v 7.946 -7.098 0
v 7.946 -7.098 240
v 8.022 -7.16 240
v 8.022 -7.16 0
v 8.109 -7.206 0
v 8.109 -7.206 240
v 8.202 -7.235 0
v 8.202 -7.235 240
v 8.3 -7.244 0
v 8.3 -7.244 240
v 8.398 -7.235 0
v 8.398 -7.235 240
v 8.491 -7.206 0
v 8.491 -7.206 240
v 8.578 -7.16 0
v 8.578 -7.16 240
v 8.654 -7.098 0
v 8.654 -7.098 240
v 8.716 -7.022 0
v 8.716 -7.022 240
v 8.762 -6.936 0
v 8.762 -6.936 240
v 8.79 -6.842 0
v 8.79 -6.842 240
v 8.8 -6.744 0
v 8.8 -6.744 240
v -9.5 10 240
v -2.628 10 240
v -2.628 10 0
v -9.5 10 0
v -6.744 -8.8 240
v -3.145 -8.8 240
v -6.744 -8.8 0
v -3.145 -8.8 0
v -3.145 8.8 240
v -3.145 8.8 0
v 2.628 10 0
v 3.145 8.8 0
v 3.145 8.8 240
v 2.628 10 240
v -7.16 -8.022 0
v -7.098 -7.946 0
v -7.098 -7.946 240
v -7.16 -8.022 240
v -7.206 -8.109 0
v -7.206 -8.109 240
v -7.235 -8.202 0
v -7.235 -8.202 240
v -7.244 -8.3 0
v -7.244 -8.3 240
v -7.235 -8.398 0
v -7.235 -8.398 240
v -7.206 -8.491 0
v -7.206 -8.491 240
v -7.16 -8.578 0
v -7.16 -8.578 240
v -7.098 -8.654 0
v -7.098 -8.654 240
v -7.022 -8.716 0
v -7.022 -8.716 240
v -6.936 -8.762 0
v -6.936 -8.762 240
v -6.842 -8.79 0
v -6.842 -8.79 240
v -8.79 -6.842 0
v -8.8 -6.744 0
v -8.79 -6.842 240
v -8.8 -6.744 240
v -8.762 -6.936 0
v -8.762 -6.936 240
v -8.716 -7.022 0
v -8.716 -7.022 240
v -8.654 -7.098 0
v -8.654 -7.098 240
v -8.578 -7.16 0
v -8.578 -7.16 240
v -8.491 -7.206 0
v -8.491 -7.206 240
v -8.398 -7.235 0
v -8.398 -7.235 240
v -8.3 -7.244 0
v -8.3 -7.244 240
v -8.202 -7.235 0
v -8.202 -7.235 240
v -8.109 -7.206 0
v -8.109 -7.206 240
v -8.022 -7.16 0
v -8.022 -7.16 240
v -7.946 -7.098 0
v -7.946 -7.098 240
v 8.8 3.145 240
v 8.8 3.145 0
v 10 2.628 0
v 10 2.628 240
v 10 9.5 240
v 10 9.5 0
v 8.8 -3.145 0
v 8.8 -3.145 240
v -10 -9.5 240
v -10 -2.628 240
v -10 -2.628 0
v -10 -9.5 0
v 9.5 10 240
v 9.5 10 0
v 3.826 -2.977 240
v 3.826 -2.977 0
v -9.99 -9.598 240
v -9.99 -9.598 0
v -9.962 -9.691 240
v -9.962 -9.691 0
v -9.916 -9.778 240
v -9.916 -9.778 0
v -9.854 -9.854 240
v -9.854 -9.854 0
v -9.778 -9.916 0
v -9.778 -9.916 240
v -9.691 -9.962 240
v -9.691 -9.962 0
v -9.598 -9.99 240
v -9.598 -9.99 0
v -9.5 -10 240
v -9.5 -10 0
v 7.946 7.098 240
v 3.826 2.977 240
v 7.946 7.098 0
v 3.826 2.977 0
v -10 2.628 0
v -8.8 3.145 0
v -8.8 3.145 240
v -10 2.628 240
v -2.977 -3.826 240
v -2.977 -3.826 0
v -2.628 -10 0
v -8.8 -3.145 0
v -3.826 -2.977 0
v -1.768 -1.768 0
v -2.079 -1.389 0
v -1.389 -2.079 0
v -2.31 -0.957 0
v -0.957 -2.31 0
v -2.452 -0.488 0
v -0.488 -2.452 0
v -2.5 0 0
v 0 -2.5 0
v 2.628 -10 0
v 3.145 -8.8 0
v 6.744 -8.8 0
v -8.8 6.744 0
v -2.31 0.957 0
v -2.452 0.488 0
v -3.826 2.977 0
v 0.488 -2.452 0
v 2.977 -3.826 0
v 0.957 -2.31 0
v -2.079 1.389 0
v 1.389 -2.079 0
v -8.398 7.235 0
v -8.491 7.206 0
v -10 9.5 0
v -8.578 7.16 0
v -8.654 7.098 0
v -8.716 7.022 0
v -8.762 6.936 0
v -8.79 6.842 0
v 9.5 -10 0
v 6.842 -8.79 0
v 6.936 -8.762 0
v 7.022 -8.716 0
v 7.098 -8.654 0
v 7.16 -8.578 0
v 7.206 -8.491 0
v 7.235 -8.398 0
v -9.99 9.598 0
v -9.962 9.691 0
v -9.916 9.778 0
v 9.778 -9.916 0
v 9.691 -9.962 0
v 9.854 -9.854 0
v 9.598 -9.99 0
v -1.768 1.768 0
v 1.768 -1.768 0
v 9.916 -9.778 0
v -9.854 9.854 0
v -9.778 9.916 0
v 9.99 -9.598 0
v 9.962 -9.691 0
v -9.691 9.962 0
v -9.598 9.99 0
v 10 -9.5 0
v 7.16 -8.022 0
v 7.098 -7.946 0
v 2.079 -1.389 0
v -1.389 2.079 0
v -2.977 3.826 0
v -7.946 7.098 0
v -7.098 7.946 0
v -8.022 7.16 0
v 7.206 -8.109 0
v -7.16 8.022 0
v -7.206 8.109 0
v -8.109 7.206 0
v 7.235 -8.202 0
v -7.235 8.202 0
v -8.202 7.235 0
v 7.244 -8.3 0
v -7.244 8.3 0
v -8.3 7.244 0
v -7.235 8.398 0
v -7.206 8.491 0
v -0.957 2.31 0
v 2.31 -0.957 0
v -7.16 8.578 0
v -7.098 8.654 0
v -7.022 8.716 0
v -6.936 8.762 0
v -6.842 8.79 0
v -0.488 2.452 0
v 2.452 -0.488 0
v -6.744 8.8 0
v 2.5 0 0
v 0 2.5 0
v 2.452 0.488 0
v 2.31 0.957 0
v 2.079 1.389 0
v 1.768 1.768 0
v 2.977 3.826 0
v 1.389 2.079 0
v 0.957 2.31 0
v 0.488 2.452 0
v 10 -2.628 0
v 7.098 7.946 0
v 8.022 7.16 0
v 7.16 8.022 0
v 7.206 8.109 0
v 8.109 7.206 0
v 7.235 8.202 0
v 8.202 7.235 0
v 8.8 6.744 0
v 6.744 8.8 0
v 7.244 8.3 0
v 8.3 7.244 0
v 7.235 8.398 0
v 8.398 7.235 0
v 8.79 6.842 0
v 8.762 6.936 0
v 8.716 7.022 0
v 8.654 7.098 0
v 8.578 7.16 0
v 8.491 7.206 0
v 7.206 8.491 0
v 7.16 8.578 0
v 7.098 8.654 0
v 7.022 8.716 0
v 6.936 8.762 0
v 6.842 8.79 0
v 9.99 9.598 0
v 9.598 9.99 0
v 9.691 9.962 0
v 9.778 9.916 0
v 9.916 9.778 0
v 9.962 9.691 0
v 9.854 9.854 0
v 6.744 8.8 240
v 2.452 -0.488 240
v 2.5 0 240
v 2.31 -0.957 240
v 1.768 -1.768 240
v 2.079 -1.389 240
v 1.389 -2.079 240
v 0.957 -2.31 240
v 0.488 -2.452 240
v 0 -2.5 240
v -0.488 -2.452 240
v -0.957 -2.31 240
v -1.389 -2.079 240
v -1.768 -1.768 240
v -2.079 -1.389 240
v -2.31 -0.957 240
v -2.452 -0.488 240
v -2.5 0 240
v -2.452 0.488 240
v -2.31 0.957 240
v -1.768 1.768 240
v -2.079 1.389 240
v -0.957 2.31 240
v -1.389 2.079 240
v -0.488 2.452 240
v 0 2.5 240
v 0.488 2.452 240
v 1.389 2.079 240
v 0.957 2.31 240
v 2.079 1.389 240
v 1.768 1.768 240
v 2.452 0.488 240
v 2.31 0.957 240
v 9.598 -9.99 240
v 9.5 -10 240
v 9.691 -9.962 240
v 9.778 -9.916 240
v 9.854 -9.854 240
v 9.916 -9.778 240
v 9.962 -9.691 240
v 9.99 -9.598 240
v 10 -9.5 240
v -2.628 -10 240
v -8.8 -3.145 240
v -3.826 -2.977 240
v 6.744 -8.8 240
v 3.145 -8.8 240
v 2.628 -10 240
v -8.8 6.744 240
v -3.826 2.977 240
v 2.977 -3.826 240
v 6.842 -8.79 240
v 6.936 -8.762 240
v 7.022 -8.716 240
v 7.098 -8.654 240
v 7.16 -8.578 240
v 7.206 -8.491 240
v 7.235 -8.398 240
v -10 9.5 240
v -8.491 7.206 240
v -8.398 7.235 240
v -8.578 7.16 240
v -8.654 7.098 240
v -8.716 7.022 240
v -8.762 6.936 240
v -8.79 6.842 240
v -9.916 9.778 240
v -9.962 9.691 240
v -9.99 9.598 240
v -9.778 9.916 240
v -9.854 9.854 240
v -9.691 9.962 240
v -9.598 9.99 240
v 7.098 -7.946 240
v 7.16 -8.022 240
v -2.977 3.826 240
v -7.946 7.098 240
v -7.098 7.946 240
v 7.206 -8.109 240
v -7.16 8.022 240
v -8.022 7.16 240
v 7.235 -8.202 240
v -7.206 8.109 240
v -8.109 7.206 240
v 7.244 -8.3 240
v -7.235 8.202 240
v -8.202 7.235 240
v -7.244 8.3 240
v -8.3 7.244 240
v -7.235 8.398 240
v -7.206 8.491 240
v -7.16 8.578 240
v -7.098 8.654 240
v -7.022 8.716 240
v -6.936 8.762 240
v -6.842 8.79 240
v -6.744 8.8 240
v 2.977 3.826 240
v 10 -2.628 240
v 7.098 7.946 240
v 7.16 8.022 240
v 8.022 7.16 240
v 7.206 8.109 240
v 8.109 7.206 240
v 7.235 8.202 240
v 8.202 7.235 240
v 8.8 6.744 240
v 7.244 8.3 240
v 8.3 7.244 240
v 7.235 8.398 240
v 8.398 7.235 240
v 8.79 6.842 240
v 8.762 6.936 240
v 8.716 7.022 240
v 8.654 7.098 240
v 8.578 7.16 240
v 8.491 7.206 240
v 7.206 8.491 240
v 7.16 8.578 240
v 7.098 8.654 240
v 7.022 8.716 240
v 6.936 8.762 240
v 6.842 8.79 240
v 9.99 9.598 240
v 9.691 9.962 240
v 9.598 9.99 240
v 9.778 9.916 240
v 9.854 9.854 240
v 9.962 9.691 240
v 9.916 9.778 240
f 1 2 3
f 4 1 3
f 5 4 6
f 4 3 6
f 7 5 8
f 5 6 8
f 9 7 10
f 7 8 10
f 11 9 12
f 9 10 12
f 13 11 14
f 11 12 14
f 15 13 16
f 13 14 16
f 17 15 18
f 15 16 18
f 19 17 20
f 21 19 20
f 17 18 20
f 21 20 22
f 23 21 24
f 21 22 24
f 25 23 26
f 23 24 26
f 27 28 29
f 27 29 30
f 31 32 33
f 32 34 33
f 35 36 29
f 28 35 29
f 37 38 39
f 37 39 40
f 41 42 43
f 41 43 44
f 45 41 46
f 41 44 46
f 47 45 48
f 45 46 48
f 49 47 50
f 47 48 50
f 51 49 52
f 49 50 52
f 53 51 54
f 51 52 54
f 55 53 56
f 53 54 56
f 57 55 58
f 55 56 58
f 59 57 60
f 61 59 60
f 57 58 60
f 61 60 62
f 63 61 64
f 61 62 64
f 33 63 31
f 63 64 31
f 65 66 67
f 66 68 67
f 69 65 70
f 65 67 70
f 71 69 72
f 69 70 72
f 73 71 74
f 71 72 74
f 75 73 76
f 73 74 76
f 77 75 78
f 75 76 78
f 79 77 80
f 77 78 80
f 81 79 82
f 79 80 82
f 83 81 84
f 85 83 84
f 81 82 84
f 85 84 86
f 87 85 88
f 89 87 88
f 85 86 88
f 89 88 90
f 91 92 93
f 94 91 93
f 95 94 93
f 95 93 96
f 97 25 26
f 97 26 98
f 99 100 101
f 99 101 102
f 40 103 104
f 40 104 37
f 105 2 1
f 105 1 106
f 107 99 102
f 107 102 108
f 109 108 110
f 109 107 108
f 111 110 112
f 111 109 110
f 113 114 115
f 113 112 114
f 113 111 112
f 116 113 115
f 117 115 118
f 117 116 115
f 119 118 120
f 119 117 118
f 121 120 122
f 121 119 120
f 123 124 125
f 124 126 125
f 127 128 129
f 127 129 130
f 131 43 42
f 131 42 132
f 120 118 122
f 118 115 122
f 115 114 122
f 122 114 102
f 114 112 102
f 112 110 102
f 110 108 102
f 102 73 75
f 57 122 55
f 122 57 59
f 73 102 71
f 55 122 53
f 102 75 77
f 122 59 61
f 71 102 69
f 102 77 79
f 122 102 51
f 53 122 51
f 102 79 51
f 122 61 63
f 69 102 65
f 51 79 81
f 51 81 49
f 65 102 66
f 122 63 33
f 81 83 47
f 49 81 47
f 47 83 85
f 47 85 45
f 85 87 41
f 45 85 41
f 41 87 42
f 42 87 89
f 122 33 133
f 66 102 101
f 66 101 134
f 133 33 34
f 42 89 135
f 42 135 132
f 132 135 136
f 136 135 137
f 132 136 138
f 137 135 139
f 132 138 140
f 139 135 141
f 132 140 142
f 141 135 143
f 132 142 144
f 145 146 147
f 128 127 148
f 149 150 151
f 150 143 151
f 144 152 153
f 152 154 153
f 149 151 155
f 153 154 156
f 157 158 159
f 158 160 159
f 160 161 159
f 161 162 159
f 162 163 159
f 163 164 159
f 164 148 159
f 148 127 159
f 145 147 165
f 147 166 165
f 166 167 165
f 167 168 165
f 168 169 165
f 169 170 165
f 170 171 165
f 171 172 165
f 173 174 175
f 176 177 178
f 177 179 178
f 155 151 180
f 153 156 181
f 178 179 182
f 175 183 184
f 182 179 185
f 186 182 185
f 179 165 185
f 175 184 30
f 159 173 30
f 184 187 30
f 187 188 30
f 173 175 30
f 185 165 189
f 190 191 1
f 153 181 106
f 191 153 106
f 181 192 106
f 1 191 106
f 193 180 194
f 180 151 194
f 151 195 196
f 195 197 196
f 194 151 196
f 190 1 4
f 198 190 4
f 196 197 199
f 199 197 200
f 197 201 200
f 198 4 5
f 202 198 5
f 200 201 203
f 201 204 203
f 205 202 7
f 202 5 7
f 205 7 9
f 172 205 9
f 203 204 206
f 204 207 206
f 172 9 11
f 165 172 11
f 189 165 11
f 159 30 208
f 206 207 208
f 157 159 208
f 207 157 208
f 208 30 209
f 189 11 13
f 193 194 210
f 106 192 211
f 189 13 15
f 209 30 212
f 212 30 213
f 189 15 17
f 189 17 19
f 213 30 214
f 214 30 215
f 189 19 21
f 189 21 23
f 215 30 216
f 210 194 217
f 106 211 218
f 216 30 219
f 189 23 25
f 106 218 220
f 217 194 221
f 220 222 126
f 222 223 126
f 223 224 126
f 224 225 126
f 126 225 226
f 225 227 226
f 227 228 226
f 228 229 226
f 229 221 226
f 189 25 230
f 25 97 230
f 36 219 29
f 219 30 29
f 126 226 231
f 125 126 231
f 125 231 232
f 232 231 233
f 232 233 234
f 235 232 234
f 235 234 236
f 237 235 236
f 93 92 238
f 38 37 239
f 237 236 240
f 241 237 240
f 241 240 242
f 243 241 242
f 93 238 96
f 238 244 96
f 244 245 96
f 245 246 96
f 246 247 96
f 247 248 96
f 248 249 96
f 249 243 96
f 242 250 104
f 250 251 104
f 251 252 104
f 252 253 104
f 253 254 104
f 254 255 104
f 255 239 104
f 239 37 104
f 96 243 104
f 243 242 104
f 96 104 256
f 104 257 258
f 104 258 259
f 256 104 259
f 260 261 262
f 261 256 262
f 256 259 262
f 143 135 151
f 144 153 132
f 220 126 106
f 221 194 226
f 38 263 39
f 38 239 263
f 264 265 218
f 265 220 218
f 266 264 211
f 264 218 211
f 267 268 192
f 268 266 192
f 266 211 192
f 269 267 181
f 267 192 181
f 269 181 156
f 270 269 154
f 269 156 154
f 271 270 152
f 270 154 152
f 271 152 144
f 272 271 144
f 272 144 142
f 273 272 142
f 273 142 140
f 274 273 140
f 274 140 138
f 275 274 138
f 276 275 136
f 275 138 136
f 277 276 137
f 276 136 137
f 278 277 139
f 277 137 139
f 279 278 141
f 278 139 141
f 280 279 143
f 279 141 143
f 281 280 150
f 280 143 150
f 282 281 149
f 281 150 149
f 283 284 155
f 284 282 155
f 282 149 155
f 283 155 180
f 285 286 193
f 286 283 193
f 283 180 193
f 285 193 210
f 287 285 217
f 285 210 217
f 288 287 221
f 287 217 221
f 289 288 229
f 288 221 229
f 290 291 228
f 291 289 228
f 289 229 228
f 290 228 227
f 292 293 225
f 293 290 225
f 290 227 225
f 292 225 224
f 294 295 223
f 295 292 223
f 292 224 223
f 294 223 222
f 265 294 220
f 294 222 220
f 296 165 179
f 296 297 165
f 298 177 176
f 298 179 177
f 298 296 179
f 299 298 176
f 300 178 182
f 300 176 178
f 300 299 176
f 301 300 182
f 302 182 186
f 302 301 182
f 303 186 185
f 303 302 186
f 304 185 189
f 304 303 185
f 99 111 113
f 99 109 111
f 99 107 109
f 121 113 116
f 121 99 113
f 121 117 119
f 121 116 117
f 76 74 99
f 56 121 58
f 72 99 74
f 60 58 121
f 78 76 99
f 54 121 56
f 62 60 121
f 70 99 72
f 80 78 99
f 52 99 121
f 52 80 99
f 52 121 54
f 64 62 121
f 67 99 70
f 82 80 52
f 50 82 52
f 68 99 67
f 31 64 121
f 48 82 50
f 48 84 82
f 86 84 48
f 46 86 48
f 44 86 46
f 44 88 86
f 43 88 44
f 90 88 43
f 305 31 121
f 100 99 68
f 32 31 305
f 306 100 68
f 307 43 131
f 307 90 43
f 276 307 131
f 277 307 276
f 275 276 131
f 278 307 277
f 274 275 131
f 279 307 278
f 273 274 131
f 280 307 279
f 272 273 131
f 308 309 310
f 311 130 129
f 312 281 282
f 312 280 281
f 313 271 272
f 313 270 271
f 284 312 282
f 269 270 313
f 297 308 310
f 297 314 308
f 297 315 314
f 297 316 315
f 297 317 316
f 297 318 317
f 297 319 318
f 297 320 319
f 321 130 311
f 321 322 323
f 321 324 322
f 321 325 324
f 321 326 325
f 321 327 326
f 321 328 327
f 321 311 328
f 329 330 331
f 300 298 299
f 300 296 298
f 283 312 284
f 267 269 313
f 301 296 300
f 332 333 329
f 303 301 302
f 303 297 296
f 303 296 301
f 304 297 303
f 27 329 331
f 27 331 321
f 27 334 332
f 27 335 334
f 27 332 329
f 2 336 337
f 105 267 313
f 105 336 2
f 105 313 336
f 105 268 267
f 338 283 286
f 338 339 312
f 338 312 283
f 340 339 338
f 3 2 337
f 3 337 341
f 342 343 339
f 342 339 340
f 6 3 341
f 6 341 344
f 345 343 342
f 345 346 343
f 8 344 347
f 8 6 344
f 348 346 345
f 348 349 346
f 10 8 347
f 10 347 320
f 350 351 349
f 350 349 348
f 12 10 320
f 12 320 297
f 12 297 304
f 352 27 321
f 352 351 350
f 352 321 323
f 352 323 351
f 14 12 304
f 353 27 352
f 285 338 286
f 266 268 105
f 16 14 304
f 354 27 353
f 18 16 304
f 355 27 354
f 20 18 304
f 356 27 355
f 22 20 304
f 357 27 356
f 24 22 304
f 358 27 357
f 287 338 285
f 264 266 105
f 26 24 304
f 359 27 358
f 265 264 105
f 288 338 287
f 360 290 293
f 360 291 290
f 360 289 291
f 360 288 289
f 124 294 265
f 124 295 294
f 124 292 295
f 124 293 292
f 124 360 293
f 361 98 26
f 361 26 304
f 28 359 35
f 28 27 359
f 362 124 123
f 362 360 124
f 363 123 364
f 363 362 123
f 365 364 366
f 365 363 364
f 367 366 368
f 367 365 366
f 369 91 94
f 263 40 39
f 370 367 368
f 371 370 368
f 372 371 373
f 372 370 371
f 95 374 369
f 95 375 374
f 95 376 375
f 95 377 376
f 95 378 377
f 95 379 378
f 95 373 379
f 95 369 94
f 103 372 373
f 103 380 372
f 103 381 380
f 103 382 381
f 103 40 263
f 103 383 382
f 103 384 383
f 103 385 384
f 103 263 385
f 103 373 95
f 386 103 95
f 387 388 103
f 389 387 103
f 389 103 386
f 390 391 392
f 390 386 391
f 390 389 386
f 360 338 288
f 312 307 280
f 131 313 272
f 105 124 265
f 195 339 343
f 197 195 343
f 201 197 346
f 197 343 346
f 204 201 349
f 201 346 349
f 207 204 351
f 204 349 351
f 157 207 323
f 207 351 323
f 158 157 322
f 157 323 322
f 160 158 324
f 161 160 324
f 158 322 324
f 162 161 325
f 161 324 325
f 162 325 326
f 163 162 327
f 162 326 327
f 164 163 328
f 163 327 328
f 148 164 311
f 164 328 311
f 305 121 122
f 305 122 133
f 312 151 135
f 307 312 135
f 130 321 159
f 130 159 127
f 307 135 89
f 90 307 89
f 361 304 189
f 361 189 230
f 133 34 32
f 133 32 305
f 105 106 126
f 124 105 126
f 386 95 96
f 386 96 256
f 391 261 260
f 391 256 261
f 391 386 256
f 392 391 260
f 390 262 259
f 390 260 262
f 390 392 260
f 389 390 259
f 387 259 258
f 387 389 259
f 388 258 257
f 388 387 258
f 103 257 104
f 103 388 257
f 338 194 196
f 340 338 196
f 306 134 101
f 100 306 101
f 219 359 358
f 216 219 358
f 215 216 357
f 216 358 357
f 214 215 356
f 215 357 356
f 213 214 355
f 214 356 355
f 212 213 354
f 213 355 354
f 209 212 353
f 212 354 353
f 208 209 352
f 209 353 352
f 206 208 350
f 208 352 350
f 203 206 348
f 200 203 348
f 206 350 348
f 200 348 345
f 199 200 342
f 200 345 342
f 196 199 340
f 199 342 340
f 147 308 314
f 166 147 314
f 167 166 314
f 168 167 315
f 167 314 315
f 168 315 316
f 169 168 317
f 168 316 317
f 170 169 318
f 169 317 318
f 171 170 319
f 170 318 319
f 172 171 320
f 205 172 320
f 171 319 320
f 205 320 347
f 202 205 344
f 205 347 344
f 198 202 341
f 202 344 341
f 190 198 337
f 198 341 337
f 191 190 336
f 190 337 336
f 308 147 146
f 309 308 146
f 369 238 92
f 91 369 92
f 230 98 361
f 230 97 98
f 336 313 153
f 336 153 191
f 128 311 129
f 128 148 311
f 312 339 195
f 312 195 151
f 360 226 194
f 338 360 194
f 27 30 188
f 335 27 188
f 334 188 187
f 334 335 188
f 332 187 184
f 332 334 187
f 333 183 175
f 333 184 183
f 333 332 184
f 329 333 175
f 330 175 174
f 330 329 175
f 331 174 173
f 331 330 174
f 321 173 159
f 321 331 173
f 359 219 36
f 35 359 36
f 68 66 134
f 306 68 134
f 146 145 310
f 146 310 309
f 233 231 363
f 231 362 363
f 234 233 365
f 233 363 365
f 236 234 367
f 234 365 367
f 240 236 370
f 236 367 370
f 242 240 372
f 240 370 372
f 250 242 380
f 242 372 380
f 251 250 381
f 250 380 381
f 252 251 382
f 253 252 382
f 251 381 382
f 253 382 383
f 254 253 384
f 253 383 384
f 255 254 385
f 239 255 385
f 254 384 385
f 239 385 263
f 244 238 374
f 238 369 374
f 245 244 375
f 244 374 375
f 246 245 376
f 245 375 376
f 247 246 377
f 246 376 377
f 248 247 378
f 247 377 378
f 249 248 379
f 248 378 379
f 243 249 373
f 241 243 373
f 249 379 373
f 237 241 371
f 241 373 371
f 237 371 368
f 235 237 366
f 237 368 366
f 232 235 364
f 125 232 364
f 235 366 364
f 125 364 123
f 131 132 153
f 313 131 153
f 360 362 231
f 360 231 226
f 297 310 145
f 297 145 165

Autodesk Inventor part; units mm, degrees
ref_plane "YZ Plane" through (0, 0, 0) normal (1, 0, 0) x (0, 1, 0)
ref_plane "XZ Plane" through (0, 0, 0) normal (0, 1, 0) x (-1, 0, 0)
ref_plane "XY Plane" through (0, 0, 0) normal (0, 0, 1) x (1, 0, 0)
sketch "Sketch1" plane through (0, 0, 0) normal (0, 0, 1) x (1, 0, 0)
  circle A0 centre (0, 0) radius 2.5
  line L0 (2.9774, 3.8259) -> (-2.9774, 3.8259)
  line L1 (-3.8259, 2.9774) -> (-3.8259, -2.9774)
  line L2 (-3.8259, -2.9774) -> (-8.8, -7.9515)
  line L3 (-7.9515, -8.8) -> (-2.9774, -3.8259)
  line L4 (2.9774, -3.8259) -> (7.9515, -8.8)
  line L5 (3.8259, 2.9774) -> (8.8, 7.9515)
  line L6 (8.8, -7.9515) -> (3.8259, -2.9774)
  line L7 (7.9515, 8.8) -> (2.9774, 3.8259)
  line L8 (-2.9774, 3.8259) -> (-7.9515, 8.8)
  line L9 (-8.8, 7.9515) -> (-3.8259, 2.9774)
  line L10 (-2.9774, -3.8259) -> (2.9774, -3.8259)
  line L11 (3.8259, -2.9774) -> (3.8259, 2.9774)
  line L12 (-3.1451, -8.8) -> (-2.6278, -10)
  line L13 (-3.1451, -8.8) -> (-7.9515, -8.8)
  line L14 (-10, -10) -> (-2.6278, -10)
  line L15 (2.6278, -10) -> (10, -10)
  line L16 (7.9515, -8.8) -> (3.1451, -8.7999)
  circle A1 centre (0, 0) radius 3.8259 construction
  line L17 (0, 0) -> (7.0677, 7.0677) construction
  circle A2 centre (2.7053, 2.7053) radius 1.1531 construction
  line L18 (-13.2321, 0) -> (16.76, 0) construction
  circle A3 centre (0, 0) radius 4.848 construction
  line L19 (2.6278, -10) -> (3.1451, -8.7999)
  line L20 (-8.8, -7.9515) -> (-8.8, -3.1451)
  line L21 (-8.8, -3.1451) -> (-10, -2.6278)
  line L22 (-8.8, 7.9515) -> (-8.8, 3.1451)
  line L23 (-8.8, 3.1451) -> (-10, 2.6278)
  line L24 (-7.9515, 8.8) -> (-3.1451, 8.8)
  line L25 (-3.1451, 8.8) -> (-2.6278, 10)
  line L26 (7.9515, 8.8) -> (3.1451, 8.8)
  line L27 (3.1451, 8.8) -> (2.6278, 10)
  line L28 (8.8, 7.9515) -> (8.8, 3.1451)
  line L29 (8.8, 3.1451) -> (10, 2.6278)
  line L30 (8.8, -7.9515) -> (8.8, -3.1451)
  line L31 (8.8, -3.1451) -> (10, -2.6278)
  line L32 (-10, 10) -> (-10, 2.6278)
  line L33 (-10, -2.6278) -> (-10, -10)
  line L34 (10, 10) -> (2.6278, 10)
  line L35 (-2.6278, 10) -> (-10, 10)
  line L36 (10, -10) -> (10, -2.6278)
  line L37 (10, 2.6278) -> (10, 10)
  point P0 (3.8259, 0)
  point P1 (-0.0241, 0)
  point P2 (-3.8259, 0)
  dimension "d3" = 20
  dimension "d4" = 20
  dimension "d5" = 5
  dimension "d10" = 1.2
  dimension "d12" = 1.2
  dimension "d13" = 1.2
  dimension "d14" = 1.2
  dimension "d16" = 20
  dimension "d17" = 1.2
  dimension "d18" = 1.2
  dimension "d19" = 1.2
  dimension "d20" = 1.2
  dimension "d21" = 1.2
  dimension "d22" = 20
extrude "Extrusion1" add sketch "Sketch1" along normal blind 240
fillet "Fillet1" radius 0.5 12 edges at (-8.8, 7.9515, 120) (-7.9515, 8.8, 120) (8.8, 7.9515, 120) (7.9515, 8.8, 120) (8.8, -7.9515, 120) (7.9515, -8.8, 120) (-7.9515, -8.8, 120) (-8.8, -7.9515, 120) (-10, -10, 120) (10, 10, 120) (-10, 10, 120) (10, -10, 120)
properties part number "240 beam"
